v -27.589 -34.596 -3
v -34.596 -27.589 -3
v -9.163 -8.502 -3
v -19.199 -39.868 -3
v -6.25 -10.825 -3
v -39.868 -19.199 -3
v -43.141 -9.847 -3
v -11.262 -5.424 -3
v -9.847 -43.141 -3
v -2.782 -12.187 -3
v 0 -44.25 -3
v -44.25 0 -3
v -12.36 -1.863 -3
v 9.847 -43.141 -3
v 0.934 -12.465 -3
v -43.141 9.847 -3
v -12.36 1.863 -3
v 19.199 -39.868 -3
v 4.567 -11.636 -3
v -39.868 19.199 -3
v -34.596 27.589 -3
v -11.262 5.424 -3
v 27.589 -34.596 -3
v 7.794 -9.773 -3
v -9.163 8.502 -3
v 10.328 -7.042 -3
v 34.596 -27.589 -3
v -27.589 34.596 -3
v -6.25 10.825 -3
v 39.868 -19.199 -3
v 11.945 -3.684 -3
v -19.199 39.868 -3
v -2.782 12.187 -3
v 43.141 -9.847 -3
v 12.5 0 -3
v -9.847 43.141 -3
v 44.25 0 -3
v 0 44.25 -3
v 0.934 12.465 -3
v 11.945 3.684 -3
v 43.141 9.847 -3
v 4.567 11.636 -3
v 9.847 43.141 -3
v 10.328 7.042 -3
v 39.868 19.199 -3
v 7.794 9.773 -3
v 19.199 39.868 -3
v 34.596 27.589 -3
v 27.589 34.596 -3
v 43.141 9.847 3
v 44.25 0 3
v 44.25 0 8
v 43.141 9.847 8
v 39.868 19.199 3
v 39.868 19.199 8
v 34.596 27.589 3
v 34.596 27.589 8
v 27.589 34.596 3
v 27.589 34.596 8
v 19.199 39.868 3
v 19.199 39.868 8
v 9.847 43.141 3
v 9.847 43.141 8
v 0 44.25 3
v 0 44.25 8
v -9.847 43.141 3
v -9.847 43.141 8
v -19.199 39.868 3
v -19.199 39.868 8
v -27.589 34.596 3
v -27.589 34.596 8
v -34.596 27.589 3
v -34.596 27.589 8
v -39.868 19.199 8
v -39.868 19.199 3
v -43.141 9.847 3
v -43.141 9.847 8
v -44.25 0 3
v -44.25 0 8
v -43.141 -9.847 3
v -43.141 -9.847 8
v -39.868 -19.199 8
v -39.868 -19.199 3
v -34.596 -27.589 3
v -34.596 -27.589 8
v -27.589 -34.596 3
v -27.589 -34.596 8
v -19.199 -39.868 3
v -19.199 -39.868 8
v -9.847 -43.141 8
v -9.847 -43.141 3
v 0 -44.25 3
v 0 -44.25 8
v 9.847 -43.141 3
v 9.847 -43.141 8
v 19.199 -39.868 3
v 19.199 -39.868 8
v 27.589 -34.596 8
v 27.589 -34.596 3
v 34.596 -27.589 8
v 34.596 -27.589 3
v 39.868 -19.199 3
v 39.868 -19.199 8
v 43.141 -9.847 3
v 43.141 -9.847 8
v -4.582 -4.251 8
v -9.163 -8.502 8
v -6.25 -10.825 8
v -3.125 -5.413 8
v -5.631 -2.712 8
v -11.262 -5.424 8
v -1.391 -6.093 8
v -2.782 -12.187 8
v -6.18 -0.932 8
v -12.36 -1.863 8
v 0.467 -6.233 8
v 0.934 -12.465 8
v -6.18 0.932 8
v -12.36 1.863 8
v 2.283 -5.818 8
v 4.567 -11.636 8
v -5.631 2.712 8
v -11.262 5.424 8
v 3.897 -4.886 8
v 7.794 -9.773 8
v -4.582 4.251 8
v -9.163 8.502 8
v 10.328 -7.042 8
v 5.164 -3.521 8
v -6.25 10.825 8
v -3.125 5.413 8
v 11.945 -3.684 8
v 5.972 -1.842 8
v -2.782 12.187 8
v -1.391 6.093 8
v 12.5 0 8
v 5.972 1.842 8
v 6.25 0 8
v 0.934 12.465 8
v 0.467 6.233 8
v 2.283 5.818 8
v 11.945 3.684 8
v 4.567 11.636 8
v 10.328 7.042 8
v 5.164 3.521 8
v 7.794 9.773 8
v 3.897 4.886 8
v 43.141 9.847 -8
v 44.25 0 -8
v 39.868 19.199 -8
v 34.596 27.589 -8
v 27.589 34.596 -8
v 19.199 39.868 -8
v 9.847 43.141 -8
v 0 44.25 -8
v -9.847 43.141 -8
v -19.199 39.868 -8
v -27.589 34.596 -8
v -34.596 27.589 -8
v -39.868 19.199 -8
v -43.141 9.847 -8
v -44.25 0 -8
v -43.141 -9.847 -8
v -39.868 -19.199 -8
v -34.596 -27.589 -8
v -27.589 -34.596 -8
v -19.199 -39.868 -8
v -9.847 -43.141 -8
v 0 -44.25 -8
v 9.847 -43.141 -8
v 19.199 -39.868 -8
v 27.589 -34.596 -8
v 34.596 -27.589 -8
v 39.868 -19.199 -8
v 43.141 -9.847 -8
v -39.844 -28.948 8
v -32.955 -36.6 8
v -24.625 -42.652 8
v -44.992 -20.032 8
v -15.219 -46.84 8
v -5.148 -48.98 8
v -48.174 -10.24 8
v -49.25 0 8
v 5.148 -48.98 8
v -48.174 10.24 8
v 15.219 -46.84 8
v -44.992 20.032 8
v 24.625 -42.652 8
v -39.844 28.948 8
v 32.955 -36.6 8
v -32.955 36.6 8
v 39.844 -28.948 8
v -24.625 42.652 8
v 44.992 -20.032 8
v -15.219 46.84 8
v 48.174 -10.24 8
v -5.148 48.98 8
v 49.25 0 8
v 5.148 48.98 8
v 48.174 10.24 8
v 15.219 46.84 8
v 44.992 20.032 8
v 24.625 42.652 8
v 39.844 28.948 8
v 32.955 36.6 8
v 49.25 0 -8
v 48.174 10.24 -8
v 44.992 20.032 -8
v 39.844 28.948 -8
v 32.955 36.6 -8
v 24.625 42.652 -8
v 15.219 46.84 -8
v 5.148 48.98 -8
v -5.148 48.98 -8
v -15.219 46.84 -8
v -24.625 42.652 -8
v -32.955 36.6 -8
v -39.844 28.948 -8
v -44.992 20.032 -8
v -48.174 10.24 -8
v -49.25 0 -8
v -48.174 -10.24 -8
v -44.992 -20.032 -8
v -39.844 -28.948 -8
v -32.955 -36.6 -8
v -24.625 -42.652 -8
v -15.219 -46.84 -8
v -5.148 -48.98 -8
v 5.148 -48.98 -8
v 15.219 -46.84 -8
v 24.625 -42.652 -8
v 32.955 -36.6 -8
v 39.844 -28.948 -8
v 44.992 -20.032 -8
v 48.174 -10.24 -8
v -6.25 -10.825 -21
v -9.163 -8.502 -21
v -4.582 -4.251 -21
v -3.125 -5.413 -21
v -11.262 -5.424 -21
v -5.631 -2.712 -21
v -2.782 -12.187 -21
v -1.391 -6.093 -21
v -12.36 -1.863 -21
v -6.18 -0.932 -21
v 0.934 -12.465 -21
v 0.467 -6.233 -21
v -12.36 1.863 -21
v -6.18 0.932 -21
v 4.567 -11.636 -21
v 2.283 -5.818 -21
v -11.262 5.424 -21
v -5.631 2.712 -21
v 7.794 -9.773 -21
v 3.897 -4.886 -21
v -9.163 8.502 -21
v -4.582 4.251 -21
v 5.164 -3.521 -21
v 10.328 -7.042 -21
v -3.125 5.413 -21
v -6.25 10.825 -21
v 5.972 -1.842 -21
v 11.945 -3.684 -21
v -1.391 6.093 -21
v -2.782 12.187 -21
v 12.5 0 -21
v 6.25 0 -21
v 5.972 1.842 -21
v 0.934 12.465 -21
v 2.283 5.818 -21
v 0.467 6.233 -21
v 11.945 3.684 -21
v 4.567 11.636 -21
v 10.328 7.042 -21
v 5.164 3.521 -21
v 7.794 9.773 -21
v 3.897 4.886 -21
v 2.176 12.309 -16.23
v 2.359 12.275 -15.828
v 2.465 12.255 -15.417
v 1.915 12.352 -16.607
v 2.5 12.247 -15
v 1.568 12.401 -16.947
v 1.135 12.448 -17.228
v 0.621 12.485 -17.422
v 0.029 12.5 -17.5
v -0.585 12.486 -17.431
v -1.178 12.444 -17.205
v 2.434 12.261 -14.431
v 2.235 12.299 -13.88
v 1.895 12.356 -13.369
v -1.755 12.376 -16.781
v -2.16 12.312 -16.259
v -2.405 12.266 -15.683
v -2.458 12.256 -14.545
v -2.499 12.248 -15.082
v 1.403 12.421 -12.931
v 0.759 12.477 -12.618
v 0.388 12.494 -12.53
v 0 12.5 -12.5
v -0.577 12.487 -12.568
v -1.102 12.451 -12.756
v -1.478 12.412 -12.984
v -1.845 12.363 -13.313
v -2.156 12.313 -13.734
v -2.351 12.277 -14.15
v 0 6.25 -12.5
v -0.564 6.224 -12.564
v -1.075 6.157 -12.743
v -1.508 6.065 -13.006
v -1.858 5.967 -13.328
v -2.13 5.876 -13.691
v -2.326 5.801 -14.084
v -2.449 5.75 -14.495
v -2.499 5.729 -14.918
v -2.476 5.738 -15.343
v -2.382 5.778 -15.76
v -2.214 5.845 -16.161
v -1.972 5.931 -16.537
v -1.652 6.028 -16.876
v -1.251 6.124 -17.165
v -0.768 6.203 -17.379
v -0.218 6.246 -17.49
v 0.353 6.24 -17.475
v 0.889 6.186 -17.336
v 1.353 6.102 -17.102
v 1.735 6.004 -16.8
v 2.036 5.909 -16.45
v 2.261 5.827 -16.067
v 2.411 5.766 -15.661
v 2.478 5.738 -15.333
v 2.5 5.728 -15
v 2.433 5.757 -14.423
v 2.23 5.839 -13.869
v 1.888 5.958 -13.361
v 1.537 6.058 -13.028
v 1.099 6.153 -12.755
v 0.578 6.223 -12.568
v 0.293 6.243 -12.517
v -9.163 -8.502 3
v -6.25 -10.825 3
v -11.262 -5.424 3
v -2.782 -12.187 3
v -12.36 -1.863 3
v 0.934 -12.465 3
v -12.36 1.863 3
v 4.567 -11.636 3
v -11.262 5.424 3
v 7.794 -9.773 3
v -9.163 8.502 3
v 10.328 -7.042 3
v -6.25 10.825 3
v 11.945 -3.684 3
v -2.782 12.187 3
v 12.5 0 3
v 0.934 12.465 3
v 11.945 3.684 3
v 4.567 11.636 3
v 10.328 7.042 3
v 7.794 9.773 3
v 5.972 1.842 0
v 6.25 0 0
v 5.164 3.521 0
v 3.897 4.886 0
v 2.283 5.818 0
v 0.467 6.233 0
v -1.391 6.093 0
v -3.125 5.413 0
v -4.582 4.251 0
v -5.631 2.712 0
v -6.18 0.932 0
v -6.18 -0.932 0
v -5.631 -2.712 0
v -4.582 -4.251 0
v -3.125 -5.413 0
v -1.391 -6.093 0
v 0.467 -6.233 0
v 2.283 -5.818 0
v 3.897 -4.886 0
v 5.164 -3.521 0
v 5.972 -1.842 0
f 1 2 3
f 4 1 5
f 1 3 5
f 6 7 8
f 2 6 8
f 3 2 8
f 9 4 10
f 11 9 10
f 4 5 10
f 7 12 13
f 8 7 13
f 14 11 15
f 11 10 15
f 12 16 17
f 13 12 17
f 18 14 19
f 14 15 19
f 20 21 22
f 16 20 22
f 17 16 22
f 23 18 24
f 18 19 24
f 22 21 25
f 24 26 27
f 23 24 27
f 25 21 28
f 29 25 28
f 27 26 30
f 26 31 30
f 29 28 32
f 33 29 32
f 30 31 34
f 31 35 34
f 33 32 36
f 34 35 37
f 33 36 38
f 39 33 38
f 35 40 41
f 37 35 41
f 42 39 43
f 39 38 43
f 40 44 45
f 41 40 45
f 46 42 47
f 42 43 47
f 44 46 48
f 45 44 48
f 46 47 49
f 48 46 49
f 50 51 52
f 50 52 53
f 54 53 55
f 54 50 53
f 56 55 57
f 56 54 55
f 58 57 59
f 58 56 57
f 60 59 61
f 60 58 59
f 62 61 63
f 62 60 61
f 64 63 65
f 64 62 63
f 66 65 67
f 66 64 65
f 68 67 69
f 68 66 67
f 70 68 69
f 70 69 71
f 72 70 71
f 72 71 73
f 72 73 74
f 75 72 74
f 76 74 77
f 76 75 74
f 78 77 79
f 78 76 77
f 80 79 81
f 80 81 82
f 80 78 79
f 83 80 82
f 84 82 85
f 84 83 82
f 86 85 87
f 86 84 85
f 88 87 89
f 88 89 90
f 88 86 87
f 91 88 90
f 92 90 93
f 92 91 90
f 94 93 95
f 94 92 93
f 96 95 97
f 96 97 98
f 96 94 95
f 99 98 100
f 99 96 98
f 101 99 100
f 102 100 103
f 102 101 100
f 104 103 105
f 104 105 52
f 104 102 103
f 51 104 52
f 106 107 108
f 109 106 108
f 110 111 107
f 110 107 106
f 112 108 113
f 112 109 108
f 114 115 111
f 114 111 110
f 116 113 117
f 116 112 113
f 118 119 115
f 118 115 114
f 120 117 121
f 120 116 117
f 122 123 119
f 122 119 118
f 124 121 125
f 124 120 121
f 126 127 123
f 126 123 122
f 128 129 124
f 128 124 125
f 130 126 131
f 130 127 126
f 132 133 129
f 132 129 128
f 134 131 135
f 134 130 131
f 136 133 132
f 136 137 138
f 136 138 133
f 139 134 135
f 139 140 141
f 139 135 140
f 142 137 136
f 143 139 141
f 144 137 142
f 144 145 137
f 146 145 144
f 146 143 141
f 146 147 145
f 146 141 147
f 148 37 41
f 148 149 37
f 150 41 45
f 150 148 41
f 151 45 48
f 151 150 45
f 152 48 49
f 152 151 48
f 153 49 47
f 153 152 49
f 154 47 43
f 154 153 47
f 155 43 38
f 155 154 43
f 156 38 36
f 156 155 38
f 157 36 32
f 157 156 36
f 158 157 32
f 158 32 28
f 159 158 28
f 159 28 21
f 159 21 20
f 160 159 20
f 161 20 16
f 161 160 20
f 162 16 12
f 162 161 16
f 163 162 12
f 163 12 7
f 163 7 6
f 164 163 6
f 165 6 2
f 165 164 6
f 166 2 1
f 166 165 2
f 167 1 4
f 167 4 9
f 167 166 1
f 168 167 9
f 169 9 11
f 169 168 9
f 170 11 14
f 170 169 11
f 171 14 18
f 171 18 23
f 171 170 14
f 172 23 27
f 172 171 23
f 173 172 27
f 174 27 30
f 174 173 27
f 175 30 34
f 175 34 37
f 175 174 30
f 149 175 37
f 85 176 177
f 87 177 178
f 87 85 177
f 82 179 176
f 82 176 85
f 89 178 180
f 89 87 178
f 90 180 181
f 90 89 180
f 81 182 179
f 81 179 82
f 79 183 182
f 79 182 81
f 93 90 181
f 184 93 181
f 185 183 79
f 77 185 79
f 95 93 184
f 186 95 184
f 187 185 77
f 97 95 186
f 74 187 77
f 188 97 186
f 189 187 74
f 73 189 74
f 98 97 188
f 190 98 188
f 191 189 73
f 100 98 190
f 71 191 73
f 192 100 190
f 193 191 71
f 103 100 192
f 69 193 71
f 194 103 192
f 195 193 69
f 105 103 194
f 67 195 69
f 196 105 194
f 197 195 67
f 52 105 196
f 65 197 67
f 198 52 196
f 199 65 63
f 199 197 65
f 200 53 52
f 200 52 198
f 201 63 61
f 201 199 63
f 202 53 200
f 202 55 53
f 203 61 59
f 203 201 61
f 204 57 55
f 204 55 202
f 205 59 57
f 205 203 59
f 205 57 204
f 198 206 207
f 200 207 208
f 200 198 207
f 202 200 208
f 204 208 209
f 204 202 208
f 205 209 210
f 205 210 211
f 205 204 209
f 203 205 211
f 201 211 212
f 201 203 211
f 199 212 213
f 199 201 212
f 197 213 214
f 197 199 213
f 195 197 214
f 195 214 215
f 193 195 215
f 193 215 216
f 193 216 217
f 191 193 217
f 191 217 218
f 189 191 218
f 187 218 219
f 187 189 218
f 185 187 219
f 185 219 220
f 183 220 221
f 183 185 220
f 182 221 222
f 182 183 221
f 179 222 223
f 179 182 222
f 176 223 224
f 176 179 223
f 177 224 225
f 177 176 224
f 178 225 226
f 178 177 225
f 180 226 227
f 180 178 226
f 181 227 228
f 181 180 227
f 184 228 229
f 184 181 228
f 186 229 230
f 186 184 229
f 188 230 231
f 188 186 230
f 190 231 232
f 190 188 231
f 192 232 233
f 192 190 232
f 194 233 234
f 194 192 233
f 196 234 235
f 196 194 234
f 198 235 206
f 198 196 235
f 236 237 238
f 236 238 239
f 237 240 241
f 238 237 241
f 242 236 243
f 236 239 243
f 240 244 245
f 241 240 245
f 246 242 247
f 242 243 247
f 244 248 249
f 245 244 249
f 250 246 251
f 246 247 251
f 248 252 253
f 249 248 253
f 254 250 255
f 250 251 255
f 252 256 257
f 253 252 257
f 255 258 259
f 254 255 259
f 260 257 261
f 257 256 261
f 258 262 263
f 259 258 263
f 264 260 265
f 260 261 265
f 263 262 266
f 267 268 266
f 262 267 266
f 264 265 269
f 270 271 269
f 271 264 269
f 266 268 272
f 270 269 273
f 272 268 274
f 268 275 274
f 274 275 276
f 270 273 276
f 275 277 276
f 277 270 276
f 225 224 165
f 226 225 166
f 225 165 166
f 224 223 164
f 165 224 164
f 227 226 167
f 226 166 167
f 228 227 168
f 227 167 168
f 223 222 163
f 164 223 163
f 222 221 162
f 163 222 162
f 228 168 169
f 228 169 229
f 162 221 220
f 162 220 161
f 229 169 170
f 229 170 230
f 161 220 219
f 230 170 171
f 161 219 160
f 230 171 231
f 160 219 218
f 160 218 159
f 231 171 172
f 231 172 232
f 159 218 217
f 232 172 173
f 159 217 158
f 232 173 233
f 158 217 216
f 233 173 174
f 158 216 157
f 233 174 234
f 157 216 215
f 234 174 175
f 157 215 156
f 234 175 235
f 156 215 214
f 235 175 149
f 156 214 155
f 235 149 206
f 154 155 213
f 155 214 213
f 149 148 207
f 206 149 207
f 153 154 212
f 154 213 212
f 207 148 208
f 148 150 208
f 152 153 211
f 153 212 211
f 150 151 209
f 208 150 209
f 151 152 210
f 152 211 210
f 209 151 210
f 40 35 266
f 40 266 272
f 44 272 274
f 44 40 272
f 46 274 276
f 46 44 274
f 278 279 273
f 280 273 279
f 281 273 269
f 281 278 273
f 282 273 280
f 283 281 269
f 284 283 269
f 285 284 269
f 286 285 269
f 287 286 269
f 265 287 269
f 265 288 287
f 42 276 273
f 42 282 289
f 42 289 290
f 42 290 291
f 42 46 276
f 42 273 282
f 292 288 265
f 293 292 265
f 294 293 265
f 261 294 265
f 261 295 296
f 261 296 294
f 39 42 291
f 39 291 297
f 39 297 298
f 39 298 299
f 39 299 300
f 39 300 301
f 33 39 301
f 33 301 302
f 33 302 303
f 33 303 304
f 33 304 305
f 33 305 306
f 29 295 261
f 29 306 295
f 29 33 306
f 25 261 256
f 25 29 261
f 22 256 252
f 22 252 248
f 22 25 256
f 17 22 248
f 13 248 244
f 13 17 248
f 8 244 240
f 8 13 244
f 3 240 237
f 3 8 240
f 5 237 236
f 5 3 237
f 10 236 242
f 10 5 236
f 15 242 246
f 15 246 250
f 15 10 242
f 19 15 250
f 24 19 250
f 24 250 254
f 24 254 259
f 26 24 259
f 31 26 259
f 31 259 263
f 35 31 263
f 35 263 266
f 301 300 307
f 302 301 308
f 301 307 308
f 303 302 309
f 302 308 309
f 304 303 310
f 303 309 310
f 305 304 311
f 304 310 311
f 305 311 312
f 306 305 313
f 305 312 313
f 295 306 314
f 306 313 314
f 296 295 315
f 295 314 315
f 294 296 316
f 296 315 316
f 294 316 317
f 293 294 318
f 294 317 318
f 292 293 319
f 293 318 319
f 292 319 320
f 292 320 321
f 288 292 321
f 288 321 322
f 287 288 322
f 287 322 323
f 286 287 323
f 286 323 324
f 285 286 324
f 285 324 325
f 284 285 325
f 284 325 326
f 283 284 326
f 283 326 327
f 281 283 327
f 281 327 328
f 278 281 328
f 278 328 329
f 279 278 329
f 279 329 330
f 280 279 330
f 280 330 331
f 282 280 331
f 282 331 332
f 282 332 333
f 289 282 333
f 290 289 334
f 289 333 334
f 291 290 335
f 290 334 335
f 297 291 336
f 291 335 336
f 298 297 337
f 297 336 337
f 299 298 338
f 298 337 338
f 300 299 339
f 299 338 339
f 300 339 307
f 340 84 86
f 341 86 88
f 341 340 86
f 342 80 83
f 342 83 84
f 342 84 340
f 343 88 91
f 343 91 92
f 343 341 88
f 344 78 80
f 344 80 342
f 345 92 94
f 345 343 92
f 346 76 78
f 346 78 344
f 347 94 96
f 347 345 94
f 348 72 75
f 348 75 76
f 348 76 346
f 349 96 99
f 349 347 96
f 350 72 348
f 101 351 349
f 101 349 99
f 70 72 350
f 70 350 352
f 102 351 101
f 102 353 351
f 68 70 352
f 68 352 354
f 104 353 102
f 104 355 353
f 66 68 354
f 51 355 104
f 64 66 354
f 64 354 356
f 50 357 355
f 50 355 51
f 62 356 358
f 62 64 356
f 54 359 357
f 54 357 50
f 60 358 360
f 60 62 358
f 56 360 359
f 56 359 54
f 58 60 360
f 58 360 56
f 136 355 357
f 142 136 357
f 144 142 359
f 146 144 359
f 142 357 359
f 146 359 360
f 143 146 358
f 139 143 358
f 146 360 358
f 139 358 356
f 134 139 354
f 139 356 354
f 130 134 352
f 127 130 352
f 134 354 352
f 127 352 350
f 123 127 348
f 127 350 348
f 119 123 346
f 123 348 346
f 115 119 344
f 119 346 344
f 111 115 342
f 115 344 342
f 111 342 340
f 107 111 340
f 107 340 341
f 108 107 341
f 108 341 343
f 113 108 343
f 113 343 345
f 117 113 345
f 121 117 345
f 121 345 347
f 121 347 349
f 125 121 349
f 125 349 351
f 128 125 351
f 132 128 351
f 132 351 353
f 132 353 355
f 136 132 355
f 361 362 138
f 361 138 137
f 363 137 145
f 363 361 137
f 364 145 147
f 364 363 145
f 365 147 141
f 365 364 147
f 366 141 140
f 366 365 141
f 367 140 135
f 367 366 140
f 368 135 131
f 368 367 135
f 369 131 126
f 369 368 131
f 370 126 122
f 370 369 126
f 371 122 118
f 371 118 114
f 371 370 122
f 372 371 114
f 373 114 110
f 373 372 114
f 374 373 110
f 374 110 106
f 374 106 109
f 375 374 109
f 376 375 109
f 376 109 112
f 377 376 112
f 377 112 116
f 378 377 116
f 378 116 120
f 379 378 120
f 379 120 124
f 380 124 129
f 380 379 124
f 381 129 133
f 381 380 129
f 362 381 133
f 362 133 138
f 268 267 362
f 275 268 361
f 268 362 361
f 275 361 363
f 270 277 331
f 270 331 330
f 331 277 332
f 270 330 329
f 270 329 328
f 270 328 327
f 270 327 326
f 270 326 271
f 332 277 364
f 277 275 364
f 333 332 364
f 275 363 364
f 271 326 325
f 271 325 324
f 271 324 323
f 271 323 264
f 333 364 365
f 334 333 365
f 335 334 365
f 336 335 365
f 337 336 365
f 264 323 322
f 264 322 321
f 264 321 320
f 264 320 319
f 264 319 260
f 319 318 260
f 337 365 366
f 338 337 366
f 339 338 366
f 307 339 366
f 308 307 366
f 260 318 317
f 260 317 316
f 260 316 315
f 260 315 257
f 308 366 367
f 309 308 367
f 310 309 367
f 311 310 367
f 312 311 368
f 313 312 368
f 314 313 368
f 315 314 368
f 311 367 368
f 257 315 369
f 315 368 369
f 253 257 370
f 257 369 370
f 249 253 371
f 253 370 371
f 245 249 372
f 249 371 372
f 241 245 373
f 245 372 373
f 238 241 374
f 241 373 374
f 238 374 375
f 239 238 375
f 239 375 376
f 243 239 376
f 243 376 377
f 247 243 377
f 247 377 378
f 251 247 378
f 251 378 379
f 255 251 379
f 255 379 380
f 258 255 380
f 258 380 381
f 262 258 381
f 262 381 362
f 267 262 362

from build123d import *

# Parameters (mm, degrees)
F0_R          = 49.25
F0_R_2        = 44.25
F1_DEPTH      = 8
F0_R_3        = 12.5
F2_DEPTH      = 3
F0_R_4        = 6.25
F3_DEPTH      = 8
F3_DEPTH_BACK = 21
F5_DEPTH      = 25


with BuildPart() as f1:
    # F0 (on Top) → F1 (new body, symmetric)
    with BuildSketch(Plane.XY):
        Circle(F0_R)
        Circle(F0_R_2, mode=Mode.SUBTRACT)
    extrude(amount=F1_DEPTH, both=True)

    # F0 (on Top) → F2 (join, symmetric)
    with BuildSketch(Plane.XY):
        Circle(F0_R_2)
        Circle(F0_R_3, mode=Mode.SUBTRACT)
    extrude(amount=F2_DEPTH, both=True)

    # F0 (on Top) → F3 (join, two sides)
    with BuildSketch(Plane.XY) as f3_sk:
        Circle(F0_R_3)
        Circle(F0_R_4, mode=Mode.SUBTRACT)
    extrude(amount=F3_DEPTH)
    extrude(f3_sk.sketch, amount=-F3_DEPTH_BACK)

    # F4 (on Front) → F5 (cut)
    with BuildSketch(Plane.XZ):
        with BuildLine():
            ThreePointArc((0, -12.5), (-1.767767, -16.767767), (2.5, -15))
            ThreePointArc((2.5, -15), (1.767767, -13.232233), (0, -12.5))
        make_face()
    extrude(amount=-F5_DEPTH, mode=Mode.SUBTRACT)


solid = f1.part
